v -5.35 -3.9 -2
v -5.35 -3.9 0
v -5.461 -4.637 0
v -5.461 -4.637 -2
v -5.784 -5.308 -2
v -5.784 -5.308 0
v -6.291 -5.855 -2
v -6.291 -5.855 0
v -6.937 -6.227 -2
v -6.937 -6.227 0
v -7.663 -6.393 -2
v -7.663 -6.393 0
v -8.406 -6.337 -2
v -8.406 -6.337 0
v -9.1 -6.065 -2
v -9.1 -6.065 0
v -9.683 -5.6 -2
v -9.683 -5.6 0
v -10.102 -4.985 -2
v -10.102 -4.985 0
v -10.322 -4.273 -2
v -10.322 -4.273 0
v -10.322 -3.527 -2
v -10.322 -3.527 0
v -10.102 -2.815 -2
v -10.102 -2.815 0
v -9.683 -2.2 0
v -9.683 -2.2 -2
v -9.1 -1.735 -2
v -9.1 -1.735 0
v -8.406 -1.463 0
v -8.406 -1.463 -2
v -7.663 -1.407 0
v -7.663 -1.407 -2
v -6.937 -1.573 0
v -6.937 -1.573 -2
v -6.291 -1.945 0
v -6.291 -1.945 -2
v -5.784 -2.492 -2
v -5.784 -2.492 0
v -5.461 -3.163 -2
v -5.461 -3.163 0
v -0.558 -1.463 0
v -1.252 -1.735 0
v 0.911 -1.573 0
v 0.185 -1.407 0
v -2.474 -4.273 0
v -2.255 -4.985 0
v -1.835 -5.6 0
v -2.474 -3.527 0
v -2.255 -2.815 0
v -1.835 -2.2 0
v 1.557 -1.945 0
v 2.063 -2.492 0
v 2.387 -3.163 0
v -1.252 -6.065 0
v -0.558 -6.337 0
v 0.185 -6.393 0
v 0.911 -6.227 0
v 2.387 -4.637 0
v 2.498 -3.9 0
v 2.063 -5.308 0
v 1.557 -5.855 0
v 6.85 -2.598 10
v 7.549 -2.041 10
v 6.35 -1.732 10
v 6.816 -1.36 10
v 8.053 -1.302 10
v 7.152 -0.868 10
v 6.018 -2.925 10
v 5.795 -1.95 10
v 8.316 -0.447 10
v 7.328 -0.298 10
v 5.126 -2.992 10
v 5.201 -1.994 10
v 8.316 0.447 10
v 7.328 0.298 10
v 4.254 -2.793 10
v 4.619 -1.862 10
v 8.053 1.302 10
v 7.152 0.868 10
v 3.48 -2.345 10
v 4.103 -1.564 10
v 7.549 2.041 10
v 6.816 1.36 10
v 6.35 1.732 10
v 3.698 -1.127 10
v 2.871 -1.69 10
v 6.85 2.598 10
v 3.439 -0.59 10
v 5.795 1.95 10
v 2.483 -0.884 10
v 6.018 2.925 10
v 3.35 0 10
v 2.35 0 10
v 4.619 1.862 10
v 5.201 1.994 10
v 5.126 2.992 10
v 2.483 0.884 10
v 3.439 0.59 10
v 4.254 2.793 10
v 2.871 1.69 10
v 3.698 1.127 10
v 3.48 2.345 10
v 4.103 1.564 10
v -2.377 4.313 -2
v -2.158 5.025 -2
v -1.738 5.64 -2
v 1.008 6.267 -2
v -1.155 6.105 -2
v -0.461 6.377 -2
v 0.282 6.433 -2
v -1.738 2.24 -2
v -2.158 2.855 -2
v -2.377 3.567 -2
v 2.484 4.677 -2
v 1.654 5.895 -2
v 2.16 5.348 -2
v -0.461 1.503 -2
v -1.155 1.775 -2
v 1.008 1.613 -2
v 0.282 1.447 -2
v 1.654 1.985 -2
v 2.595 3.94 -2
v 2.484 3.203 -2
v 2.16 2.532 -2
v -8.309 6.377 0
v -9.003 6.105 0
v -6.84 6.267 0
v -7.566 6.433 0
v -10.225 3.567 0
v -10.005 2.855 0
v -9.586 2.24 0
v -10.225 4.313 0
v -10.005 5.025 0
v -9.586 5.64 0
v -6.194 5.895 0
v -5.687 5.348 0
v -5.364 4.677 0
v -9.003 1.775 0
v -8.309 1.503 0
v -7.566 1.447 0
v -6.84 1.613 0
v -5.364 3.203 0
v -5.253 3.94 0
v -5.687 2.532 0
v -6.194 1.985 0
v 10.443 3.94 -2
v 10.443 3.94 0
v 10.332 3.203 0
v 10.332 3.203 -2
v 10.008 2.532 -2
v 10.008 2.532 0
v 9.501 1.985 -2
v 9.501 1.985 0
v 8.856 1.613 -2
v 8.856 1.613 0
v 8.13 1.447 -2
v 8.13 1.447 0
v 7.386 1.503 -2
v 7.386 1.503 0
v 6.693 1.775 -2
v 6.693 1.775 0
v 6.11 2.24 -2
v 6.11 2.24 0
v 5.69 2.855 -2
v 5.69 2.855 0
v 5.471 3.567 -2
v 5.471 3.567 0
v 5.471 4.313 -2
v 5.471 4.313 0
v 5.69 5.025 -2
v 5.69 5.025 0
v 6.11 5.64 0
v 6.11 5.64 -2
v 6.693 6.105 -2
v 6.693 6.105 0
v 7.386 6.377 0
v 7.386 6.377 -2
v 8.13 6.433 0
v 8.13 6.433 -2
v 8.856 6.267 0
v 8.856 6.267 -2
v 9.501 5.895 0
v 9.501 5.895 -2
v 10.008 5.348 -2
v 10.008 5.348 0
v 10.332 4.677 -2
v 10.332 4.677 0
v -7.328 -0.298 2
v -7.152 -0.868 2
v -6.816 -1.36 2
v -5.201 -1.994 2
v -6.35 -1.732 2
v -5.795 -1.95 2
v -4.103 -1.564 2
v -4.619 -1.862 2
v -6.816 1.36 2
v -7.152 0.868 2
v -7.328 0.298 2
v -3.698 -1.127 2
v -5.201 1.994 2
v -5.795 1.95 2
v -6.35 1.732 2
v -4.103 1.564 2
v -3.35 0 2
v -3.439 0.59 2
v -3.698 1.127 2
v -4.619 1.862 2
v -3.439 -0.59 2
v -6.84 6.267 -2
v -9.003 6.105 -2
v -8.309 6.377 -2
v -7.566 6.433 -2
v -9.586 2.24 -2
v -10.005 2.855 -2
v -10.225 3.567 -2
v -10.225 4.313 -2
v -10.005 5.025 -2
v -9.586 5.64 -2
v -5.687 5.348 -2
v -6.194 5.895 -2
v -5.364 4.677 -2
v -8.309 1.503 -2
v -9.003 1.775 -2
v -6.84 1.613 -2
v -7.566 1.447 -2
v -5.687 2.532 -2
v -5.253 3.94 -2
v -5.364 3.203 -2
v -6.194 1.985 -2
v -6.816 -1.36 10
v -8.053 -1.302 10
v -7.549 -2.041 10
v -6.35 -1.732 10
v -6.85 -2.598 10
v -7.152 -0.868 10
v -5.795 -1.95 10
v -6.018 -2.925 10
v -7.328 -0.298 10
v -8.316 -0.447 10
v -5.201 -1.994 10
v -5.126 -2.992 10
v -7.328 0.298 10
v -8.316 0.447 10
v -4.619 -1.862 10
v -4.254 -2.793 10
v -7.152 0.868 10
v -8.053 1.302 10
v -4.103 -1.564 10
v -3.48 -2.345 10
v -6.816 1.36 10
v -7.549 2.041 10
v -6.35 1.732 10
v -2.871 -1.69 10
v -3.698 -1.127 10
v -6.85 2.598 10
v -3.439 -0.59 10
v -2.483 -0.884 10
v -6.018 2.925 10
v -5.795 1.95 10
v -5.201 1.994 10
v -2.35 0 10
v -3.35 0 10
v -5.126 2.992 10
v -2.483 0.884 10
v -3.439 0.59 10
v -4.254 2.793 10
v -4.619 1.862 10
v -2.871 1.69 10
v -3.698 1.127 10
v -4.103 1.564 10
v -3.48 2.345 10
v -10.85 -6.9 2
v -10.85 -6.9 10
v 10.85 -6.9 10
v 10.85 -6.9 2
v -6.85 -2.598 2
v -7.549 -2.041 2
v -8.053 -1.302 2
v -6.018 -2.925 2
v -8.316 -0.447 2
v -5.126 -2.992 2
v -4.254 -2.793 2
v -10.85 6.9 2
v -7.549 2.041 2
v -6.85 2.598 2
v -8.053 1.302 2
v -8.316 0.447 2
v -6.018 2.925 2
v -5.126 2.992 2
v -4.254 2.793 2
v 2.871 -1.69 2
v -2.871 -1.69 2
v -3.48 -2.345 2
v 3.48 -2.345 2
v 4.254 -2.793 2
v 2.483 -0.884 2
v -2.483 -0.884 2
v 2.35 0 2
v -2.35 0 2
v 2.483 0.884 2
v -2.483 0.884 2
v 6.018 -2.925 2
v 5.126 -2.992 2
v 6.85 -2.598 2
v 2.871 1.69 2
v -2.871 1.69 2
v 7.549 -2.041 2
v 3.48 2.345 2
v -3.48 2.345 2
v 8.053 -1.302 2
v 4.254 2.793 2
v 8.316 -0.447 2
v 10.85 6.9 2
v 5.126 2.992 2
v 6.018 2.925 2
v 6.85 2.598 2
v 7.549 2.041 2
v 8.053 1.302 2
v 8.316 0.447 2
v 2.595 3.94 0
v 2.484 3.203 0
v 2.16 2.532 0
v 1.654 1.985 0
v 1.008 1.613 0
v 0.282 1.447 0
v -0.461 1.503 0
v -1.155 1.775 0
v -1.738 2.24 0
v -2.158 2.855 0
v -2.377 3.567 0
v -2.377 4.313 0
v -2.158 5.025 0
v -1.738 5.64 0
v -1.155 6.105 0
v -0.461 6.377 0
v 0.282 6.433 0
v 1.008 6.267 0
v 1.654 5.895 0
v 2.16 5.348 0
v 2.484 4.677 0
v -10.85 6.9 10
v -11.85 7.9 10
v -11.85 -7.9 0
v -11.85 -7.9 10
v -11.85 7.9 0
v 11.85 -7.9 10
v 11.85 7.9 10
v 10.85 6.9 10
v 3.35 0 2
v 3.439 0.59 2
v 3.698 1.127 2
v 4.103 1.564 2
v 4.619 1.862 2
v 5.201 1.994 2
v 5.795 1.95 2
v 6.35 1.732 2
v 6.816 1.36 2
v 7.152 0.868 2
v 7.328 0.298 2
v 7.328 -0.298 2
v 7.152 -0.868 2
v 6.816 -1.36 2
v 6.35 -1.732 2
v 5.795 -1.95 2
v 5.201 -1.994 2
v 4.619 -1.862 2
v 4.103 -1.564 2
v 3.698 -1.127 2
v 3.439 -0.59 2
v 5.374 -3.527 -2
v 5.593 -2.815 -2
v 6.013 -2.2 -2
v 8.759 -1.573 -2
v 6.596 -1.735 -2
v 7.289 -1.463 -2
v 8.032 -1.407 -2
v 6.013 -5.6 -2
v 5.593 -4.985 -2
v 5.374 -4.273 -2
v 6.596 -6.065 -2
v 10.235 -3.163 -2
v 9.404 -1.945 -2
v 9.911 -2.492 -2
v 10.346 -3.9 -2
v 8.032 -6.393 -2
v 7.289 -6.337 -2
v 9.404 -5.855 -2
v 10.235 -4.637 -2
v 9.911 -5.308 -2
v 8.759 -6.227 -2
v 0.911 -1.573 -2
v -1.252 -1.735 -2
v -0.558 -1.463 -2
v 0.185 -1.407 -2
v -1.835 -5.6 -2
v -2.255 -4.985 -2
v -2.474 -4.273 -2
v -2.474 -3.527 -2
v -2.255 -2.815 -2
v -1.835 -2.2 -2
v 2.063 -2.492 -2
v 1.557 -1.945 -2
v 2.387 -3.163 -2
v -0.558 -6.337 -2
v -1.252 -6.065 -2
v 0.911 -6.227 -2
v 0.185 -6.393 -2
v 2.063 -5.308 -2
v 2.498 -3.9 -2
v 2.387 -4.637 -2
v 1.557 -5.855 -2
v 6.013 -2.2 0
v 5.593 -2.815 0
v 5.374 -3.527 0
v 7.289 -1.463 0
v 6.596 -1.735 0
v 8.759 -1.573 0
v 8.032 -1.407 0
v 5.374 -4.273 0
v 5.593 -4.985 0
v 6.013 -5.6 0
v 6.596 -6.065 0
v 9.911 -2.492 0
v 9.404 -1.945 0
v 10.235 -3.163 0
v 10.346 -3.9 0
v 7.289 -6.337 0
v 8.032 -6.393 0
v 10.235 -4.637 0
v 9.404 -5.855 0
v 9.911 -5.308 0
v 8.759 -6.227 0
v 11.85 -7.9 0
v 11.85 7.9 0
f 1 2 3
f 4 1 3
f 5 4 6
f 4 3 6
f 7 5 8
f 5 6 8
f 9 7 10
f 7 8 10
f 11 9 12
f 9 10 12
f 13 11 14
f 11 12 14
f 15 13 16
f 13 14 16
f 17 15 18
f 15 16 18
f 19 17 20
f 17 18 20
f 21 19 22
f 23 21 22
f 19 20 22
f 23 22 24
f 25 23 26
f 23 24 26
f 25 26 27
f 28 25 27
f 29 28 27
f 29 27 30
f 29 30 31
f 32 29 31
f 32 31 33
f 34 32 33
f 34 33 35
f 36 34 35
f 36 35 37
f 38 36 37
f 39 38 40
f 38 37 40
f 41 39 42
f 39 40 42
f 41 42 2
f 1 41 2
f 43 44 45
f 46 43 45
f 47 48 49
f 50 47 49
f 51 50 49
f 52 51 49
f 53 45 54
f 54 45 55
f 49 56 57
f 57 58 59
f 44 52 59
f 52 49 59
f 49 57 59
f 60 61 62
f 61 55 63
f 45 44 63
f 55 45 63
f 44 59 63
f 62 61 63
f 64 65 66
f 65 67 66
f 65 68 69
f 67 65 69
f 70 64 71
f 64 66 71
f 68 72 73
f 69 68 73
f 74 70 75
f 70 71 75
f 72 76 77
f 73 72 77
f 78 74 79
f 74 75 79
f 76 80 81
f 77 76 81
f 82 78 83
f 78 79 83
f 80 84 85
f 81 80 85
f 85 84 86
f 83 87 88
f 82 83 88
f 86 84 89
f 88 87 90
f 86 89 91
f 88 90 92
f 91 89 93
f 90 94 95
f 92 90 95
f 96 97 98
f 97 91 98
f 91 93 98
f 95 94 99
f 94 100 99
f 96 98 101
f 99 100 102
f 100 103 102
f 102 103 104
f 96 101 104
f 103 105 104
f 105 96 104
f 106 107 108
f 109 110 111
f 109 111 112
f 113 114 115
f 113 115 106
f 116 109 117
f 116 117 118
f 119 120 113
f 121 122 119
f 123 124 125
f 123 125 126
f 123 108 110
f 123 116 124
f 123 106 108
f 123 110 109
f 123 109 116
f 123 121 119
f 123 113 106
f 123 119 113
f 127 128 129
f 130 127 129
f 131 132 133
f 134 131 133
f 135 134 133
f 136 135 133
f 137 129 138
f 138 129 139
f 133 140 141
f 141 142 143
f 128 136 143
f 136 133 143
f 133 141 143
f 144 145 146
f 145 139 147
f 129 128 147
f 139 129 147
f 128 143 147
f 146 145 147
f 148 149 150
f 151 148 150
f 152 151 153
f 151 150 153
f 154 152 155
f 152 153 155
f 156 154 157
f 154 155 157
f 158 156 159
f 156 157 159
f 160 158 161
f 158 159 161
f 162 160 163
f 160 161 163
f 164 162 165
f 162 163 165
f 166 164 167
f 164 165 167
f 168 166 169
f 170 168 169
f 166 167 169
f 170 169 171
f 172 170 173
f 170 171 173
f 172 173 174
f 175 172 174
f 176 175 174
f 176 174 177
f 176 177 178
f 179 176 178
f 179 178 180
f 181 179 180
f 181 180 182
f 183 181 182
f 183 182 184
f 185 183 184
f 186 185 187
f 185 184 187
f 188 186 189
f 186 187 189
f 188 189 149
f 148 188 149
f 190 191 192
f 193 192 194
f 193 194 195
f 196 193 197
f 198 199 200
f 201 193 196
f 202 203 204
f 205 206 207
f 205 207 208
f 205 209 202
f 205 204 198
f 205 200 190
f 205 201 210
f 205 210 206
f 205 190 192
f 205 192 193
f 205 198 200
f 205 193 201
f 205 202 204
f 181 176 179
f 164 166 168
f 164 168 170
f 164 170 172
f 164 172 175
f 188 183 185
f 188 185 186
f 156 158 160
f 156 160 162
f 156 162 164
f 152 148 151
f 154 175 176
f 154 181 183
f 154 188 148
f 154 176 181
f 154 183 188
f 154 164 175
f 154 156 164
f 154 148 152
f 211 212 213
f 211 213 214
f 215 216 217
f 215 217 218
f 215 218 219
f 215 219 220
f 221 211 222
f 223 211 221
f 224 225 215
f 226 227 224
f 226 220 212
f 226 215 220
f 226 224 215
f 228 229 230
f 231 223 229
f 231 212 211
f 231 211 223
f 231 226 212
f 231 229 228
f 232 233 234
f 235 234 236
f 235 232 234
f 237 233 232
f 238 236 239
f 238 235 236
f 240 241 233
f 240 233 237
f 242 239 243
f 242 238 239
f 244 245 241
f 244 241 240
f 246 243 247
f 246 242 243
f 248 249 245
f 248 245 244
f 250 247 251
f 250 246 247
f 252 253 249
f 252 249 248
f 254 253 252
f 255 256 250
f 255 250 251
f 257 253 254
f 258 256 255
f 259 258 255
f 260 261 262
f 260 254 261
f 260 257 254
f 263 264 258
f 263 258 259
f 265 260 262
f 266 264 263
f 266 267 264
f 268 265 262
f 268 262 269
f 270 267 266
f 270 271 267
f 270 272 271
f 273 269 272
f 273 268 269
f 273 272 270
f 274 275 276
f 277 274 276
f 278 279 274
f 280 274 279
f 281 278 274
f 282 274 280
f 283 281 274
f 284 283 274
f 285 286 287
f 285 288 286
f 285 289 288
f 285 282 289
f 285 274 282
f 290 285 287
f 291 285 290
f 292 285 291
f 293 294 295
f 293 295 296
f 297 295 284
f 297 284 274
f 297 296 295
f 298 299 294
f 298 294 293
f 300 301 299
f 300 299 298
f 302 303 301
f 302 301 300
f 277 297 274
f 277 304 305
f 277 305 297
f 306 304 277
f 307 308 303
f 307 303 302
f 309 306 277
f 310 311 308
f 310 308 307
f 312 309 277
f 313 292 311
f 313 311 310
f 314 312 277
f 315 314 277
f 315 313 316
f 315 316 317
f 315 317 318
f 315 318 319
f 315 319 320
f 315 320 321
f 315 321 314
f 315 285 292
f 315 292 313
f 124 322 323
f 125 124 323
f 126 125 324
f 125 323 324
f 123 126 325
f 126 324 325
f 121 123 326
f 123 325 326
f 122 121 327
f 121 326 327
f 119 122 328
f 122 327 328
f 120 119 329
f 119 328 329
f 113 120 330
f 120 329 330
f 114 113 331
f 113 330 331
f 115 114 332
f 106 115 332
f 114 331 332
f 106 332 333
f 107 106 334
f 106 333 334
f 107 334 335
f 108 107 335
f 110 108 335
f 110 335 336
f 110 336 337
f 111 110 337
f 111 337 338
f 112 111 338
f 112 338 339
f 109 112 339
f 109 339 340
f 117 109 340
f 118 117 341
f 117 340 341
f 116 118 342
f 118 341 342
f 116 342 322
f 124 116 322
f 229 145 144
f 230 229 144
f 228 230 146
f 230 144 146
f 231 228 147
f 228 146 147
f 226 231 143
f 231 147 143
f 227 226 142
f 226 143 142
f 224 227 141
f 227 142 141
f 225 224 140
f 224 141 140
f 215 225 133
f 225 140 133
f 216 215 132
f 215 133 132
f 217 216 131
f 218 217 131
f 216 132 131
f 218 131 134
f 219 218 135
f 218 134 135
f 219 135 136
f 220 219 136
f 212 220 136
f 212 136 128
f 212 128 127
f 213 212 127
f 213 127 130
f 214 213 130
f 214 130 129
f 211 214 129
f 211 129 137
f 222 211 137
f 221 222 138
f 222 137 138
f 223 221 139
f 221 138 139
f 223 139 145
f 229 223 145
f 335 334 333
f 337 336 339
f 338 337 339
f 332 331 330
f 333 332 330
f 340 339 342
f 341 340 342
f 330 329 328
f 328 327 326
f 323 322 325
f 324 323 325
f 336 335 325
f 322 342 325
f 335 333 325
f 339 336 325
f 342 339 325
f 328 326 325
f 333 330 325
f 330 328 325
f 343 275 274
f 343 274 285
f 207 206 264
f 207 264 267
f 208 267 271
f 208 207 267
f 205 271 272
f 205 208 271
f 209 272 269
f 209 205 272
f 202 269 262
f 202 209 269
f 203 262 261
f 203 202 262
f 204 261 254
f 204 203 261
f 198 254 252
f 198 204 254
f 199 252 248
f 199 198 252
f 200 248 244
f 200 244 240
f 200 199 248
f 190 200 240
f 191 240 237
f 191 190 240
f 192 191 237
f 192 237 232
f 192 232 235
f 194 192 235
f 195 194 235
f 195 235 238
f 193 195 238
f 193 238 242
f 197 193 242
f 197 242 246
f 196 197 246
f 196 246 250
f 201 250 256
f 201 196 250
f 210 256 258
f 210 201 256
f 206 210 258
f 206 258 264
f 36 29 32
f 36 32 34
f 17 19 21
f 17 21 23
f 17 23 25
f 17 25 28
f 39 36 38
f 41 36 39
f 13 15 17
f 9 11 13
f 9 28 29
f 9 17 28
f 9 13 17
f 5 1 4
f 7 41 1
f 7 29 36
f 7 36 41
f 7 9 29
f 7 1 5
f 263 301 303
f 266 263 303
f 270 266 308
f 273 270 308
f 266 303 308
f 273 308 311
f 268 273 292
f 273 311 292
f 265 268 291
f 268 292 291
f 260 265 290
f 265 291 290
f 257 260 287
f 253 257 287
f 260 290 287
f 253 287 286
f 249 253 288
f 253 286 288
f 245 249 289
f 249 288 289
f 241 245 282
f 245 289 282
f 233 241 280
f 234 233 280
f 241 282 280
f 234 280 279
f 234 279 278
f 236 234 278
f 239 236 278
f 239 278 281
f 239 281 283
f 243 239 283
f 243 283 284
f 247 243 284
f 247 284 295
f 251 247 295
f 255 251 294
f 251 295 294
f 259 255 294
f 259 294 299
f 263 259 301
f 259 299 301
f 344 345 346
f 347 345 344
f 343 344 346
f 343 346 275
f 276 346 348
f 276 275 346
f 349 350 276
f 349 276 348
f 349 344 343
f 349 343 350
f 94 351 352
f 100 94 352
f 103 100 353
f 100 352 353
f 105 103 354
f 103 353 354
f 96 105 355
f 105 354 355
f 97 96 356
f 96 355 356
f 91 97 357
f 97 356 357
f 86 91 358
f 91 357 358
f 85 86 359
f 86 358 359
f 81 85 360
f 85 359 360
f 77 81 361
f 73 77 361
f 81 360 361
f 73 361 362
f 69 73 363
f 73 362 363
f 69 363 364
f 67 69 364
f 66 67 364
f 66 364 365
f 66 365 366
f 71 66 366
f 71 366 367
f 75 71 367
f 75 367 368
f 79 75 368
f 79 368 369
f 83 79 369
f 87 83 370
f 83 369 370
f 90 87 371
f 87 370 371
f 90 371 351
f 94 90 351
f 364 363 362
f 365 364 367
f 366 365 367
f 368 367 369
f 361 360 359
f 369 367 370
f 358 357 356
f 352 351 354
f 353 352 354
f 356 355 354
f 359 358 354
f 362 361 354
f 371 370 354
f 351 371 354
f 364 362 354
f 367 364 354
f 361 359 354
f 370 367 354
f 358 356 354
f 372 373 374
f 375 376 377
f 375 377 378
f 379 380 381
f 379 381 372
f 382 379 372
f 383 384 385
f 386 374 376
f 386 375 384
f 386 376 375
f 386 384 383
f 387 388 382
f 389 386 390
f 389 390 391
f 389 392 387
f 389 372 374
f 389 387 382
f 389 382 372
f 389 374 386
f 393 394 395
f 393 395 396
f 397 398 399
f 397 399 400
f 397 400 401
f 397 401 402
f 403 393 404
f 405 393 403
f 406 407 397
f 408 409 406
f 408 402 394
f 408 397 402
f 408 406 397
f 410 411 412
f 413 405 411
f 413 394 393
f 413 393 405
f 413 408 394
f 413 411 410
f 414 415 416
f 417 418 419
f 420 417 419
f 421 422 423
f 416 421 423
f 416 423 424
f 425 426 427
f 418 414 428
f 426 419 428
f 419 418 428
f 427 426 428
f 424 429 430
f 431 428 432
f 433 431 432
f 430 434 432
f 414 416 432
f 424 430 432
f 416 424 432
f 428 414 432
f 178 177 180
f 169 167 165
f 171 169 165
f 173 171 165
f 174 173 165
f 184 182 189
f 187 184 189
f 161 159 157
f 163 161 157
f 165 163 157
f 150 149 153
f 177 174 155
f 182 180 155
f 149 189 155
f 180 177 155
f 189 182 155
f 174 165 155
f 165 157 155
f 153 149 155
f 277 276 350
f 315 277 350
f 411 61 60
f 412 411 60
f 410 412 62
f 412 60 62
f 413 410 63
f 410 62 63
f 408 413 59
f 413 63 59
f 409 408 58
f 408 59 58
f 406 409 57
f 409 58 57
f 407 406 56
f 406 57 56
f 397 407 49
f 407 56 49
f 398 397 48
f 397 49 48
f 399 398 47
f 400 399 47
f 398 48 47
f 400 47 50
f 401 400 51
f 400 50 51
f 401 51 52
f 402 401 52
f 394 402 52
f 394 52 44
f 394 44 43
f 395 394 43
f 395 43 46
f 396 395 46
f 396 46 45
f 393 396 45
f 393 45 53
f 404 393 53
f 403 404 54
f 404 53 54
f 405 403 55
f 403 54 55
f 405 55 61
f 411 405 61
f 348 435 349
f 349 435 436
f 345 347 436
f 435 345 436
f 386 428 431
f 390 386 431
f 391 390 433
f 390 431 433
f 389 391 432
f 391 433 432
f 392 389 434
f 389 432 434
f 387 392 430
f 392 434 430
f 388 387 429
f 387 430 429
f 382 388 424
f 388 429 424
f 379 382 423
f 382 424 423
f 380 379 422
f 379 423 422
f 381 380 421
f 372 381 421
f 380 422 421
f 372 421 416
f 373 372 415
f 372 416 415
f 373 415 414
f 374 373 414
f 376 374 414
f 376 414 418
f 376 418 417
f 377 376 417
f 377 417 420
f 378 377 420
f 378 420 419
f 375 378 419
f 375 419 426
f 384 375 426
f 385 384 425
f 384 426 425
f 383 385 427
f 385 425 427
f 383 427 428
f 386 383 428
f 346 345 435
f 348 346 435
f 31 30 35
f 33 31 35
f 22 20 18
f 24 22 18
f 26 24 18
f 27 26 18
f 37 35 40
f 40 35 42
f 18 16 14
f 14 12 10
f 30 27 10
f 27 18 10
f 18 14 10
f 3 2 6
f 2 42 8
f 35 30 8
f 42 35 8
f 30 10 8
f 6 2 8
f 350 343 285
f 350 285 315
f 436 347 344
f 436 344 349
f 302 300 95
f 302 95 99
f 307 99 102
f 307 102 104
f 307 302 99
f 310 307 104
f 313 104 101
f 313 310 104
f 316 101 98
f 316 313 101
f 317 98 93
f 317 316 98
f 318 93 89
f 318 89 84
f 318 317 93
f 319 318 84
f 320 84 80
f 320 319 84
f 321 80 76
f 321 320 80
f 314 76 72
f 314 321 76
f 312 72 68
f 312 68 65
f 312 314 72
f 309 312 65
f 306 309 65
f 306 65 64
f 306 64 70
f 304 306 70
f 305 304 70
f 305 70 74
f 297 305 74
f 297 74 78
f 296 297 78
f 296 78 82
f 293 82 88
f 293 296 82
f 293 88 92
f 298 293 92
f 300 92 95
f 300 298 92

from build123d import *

# Parameters (mm, degrees)
F0_W      = 23.7
F0_H      = 15.8
F1_DEPTH  = 10
F9_W      = 21.7
F9_H      = 13.8
F10_DEPTH = 8
F11_R     = 3
F11_R_2   = 2
F12_DEPTH = 8
F15_R     = 2.5
F16_DEPTH = 2


# Not quite as in the source:
# - the program builds the solid bodies; features that only make, move or delete a surface that nothing else refers to are left out


with BuildPart() as f1:
    # F0 (on Top) → F1 (new body)
    with BuildSketch(Plane.XY):
        Rectangle(F0_W, F0_H)
    extrude(amount=F1_DEPTH)

    # F9 (on face) → F10 (cut)
    with BuildSketch(Plane.XY.offset(10)):
        Rectangle(F9_W, F9_H)
    extrude(amount=-F10_DEPTH, mode=Mode.SUBTRACT)

    # F11 (on face) → F12 (join, through all)
    with BuildSketch(Plane.XY.offset(2)):
        with Locations((-5.35, 0)):
            Circle(F11_R)
        with Locations((-5.35, 0)):
            Circle(F11_R_2, mode=Mode.SUBTRACT)
    extrude(amount=F12_DEPTH)

    # F13: F1 across plane


with BuildPart() as f1_1:
    add(f1.part)
    add(f1.part.mirror(Plane.YZ))


with BuildPart() as f16:
    # F15 (on face) → F16 (new body)
    with BuildSketch(Plane(origin=(0, 0, 0), x_dir=(1, 0, 0), z_dir=(0, 0, -1))):
        with Locations((-7.752910628, -3.9399788514)):
            Circle(F15_R)
    extrude(amount=F16_DEPTH)


with BuildPart() as f16b:
    # F15 (on face) → F16, piece 2 (new body)
    with BuildSketch(Plane(origin=(0, 0, 0), x_dir=(1, 0, 0), z_dir=(0, 0, -1))):
        with Locations((-7.85, 3.9)):
            Circle(F15_R)
    extrude(amount=F16_DEPTH)


with BuildPart() as f16c:
    # F15 (on face) → F16, piece 3 (new body)
    with BuildSketch(Plane(origin=(0, 0, 0), x_dir=(1, 0, 0), z_dir=(0, 0, -1))):
        with Locations((-0.00219, 3.9)):
            Circle(F15_R)
    extrude(amount=F16_DEPTH)


with BuildPart() as f16d:
    # F15 (on face) → F16, piece 4 (new body)
    with BuildSketch(Plane(origin=(0, 0, 0), x_dir=(1, 0, 0), z_dir=(0, 0, -1))):
        with Locations((7.84562, 3.9)):
            Circle(F15_R)
    extrude(amount=F16_DEPTH)


with BuildPart() as f16e:
    # F15 (on face) → F16, piece 5 (new body)
    with BuildSketch(Plane(origin=(0, 0, 0), x_dir=(1, 0, 0), z_dir=(0, 0, -1))):
        with Locations((7.942709372, -3.9399788514)):
            Circle(F15_R)
    extrude(amount=F16_DEPTH)


with BuildPart() as f16f:
    # F15 (on face) → F16, piece 6 (new body)
    with BuildSketch(Plane(origin=(0, 0, 0), x_dir=(1, 0, 0), z_dir=(0, 0, -1))):
        with Locations((0.094899372, -3.9399788514)):
            Circle(F15_R)
    extrude(amount=F16_DEPTH)


solid = Compound([f1_1.part, f16.part, f16b.part, f16c.part, f16d.part, f16e.part, f16f.part])
